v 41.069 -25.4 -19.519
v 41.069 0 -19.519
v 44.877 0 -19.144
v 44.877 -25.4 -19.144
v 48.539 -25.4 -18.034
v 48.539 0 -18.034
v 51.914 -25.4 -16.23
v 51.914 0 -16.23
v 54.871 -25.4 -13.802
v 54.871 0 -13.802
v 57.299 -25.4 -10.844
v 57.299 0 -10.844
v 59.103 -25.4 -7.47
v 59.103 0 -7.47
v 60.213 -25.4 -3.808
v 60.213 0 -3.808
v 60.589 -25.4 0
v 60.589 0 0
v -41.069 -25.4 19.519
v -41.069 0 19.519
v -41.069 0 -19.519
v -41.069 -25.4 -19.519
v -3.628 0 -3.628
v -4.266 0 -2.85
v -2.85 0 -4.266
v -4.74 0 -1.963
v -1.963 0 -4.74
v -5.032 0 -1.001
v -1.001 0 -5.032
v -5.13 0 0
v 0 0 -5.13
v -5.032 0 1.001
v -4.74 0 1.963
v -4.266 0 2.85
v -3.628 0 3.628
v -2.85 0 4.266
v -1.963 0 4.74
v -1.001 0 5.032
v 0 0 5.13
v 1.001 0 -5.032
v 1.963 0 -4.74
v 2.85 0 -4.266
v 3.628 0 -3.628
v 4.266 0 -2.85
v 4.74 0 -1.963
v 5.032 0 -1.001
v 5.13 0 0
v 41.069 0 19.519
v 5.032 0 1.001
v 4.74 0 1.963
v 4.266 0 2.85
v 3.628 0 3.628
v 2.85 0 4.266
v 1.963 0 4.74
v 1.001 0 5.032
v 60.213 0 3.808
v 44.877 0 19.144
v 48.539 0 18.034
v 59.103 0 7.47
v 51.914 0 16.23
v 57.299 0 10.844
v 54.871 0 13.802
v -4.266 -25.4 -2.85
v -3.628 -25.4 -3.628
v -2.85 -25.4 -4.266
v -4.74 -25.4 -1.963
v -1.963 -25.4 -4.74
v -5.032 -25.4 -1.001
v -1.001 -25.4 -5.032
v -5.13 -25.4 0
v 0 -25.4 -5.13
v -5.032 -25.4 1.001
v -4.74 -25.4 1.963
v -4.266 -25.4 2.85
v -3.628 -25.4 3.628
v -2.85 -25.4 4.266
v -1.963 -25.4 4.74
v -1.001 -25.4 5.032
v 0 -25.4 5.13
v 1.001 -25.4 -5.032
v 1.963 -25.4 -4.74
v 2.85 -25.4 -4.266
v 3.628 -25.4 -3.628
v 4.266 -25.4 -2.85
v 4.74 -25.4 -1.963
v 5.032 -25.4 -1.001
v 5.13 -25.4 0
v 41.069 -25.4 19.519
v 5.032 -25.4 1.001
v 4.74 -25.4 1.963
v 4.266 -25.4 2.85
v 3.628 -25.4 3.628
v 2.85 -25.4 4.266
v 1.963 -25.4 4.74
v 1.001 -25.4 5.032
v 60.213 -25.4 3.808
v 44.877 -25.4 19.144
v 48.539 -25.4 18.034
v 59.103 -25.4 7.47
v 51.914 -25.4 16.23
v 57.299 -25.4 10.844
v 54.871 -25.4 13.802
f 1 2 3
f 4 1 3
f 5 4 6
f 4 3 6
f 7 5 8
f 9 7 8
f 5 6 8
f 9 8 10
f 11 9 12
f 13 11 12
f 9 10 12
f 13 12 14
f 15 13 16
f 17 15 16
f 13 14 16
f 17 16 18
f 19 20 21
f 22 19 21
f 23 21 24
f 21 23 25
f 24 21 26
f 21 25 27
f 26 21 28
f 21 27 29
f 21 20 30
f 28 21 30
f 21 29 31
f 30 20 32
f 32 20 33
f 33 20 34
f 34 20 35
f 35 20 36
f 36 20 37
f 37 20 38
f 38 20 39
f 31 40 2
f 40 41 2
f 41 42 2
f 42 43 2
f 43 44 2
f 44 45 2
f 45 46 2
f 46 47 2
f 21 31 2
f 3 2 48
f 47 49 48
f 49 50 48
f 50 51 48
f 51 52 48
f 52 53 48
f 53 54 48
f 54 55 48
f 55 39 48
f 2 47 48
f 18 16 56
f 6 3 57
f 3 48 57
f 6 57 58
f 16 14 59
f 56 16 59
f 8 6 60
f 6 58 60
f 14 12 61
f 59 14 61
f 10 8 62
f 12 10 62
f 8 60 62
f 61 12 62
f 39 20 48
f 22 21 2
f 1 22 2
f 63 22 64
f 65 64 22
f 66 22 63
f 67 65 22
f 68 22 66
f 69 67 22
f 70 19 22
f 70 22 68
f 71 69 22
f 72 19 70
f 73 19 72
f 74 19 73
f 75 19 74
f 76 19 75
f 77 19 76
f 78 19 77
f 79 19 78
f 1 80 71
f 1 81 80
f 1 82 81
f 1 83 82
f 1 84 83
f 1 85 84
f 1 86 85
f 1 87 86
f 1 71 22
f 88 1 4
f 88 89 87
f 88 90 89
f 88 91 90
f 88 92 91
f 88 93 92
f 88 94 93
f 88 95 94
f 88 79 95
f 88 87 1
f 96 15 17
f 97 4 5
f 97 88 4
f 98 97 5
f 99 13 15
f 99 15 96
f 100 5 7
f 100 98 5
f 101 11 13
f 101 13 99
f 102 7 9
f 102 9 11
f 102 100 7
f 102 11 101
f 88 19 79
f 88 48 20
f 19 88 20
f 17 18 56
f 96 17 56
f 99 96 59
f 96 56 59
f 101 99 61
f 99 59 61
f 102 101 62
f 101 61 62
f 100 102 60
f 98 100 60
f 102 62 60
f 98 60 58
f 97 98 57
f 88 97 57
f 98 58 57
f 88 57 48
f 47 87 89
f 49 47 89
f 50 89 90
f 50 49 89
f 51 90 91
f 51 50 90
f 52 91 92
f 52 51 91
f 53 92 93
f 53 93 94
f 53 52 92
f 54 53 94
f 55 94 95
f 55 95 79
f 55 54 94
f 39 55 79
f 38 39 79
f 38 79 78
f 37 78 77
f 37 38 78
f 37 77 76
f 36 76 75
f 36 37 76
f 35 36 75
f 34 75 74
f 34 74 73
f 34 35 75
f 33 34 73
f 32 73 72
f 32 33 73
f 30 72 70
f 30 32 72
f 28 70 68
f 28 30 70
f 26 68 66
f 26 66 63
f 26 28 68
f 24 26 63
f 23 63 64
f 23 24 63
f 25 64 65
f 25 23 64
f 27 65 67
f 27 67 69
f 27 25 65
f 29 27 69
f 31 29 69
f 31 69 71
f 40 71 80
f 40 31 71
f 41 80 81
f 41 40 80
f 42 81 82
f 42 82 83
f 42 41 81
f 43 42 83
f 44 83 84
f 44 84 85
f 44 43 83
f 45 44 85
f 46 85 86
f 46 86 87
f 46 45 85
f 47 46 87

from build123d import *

# Parameters (mm, degrees)
F0_R     = 5.1303996858
F1_DEPTH = 25.4


with BuildPart() as f1:
    # F0 (on Front) → F1 (new body)
    with BuildSketch(Plane.XZ):
        with BuildLine():
            ThreePointArc((41.0692058504, -19.5193476975), (21.5498581529, 0), (41.0692058504, 19.5193476975))
            Line((41.0692058504, 19.5193476975), (-41.0692058504, 19.5193476975))
            Line((-41.0692058504, 19.5193476975), (-41.0692058504, -19.5193476975))
            Line((-41.0692058504, -19.5193476975), (41.0692058504, -19.5193476975))
        make_face()
        Circle(F0_R, mode=Mode.SUBTRACT)
        with BuildLine():
            ThreePointArc((60.5885535479, 0), (54.8714689716, 13.8022631212), (41.0692058504, 19.5193476975))
            Line((41.0692058504, 19.5193476975), (41.0692058504, -19.5193476975))
            ThreePointArc((41.0692058504, -19.5193476975), (54.8714689716, -13.8022631212), (60.5885535479, 0))
        make_face()
        with BuildLine():
            Line((41.0692058504, -19.5193476975), (41.0692058504, 19.5193476975))
            ThreePointArc((41.0692058504, 19.5193476975), (21.5498581529, 0), (41.0692058504, -19.5193476975))
        make_face()
    extrude(amount=F1_DEPTH)


solid = f1.part
